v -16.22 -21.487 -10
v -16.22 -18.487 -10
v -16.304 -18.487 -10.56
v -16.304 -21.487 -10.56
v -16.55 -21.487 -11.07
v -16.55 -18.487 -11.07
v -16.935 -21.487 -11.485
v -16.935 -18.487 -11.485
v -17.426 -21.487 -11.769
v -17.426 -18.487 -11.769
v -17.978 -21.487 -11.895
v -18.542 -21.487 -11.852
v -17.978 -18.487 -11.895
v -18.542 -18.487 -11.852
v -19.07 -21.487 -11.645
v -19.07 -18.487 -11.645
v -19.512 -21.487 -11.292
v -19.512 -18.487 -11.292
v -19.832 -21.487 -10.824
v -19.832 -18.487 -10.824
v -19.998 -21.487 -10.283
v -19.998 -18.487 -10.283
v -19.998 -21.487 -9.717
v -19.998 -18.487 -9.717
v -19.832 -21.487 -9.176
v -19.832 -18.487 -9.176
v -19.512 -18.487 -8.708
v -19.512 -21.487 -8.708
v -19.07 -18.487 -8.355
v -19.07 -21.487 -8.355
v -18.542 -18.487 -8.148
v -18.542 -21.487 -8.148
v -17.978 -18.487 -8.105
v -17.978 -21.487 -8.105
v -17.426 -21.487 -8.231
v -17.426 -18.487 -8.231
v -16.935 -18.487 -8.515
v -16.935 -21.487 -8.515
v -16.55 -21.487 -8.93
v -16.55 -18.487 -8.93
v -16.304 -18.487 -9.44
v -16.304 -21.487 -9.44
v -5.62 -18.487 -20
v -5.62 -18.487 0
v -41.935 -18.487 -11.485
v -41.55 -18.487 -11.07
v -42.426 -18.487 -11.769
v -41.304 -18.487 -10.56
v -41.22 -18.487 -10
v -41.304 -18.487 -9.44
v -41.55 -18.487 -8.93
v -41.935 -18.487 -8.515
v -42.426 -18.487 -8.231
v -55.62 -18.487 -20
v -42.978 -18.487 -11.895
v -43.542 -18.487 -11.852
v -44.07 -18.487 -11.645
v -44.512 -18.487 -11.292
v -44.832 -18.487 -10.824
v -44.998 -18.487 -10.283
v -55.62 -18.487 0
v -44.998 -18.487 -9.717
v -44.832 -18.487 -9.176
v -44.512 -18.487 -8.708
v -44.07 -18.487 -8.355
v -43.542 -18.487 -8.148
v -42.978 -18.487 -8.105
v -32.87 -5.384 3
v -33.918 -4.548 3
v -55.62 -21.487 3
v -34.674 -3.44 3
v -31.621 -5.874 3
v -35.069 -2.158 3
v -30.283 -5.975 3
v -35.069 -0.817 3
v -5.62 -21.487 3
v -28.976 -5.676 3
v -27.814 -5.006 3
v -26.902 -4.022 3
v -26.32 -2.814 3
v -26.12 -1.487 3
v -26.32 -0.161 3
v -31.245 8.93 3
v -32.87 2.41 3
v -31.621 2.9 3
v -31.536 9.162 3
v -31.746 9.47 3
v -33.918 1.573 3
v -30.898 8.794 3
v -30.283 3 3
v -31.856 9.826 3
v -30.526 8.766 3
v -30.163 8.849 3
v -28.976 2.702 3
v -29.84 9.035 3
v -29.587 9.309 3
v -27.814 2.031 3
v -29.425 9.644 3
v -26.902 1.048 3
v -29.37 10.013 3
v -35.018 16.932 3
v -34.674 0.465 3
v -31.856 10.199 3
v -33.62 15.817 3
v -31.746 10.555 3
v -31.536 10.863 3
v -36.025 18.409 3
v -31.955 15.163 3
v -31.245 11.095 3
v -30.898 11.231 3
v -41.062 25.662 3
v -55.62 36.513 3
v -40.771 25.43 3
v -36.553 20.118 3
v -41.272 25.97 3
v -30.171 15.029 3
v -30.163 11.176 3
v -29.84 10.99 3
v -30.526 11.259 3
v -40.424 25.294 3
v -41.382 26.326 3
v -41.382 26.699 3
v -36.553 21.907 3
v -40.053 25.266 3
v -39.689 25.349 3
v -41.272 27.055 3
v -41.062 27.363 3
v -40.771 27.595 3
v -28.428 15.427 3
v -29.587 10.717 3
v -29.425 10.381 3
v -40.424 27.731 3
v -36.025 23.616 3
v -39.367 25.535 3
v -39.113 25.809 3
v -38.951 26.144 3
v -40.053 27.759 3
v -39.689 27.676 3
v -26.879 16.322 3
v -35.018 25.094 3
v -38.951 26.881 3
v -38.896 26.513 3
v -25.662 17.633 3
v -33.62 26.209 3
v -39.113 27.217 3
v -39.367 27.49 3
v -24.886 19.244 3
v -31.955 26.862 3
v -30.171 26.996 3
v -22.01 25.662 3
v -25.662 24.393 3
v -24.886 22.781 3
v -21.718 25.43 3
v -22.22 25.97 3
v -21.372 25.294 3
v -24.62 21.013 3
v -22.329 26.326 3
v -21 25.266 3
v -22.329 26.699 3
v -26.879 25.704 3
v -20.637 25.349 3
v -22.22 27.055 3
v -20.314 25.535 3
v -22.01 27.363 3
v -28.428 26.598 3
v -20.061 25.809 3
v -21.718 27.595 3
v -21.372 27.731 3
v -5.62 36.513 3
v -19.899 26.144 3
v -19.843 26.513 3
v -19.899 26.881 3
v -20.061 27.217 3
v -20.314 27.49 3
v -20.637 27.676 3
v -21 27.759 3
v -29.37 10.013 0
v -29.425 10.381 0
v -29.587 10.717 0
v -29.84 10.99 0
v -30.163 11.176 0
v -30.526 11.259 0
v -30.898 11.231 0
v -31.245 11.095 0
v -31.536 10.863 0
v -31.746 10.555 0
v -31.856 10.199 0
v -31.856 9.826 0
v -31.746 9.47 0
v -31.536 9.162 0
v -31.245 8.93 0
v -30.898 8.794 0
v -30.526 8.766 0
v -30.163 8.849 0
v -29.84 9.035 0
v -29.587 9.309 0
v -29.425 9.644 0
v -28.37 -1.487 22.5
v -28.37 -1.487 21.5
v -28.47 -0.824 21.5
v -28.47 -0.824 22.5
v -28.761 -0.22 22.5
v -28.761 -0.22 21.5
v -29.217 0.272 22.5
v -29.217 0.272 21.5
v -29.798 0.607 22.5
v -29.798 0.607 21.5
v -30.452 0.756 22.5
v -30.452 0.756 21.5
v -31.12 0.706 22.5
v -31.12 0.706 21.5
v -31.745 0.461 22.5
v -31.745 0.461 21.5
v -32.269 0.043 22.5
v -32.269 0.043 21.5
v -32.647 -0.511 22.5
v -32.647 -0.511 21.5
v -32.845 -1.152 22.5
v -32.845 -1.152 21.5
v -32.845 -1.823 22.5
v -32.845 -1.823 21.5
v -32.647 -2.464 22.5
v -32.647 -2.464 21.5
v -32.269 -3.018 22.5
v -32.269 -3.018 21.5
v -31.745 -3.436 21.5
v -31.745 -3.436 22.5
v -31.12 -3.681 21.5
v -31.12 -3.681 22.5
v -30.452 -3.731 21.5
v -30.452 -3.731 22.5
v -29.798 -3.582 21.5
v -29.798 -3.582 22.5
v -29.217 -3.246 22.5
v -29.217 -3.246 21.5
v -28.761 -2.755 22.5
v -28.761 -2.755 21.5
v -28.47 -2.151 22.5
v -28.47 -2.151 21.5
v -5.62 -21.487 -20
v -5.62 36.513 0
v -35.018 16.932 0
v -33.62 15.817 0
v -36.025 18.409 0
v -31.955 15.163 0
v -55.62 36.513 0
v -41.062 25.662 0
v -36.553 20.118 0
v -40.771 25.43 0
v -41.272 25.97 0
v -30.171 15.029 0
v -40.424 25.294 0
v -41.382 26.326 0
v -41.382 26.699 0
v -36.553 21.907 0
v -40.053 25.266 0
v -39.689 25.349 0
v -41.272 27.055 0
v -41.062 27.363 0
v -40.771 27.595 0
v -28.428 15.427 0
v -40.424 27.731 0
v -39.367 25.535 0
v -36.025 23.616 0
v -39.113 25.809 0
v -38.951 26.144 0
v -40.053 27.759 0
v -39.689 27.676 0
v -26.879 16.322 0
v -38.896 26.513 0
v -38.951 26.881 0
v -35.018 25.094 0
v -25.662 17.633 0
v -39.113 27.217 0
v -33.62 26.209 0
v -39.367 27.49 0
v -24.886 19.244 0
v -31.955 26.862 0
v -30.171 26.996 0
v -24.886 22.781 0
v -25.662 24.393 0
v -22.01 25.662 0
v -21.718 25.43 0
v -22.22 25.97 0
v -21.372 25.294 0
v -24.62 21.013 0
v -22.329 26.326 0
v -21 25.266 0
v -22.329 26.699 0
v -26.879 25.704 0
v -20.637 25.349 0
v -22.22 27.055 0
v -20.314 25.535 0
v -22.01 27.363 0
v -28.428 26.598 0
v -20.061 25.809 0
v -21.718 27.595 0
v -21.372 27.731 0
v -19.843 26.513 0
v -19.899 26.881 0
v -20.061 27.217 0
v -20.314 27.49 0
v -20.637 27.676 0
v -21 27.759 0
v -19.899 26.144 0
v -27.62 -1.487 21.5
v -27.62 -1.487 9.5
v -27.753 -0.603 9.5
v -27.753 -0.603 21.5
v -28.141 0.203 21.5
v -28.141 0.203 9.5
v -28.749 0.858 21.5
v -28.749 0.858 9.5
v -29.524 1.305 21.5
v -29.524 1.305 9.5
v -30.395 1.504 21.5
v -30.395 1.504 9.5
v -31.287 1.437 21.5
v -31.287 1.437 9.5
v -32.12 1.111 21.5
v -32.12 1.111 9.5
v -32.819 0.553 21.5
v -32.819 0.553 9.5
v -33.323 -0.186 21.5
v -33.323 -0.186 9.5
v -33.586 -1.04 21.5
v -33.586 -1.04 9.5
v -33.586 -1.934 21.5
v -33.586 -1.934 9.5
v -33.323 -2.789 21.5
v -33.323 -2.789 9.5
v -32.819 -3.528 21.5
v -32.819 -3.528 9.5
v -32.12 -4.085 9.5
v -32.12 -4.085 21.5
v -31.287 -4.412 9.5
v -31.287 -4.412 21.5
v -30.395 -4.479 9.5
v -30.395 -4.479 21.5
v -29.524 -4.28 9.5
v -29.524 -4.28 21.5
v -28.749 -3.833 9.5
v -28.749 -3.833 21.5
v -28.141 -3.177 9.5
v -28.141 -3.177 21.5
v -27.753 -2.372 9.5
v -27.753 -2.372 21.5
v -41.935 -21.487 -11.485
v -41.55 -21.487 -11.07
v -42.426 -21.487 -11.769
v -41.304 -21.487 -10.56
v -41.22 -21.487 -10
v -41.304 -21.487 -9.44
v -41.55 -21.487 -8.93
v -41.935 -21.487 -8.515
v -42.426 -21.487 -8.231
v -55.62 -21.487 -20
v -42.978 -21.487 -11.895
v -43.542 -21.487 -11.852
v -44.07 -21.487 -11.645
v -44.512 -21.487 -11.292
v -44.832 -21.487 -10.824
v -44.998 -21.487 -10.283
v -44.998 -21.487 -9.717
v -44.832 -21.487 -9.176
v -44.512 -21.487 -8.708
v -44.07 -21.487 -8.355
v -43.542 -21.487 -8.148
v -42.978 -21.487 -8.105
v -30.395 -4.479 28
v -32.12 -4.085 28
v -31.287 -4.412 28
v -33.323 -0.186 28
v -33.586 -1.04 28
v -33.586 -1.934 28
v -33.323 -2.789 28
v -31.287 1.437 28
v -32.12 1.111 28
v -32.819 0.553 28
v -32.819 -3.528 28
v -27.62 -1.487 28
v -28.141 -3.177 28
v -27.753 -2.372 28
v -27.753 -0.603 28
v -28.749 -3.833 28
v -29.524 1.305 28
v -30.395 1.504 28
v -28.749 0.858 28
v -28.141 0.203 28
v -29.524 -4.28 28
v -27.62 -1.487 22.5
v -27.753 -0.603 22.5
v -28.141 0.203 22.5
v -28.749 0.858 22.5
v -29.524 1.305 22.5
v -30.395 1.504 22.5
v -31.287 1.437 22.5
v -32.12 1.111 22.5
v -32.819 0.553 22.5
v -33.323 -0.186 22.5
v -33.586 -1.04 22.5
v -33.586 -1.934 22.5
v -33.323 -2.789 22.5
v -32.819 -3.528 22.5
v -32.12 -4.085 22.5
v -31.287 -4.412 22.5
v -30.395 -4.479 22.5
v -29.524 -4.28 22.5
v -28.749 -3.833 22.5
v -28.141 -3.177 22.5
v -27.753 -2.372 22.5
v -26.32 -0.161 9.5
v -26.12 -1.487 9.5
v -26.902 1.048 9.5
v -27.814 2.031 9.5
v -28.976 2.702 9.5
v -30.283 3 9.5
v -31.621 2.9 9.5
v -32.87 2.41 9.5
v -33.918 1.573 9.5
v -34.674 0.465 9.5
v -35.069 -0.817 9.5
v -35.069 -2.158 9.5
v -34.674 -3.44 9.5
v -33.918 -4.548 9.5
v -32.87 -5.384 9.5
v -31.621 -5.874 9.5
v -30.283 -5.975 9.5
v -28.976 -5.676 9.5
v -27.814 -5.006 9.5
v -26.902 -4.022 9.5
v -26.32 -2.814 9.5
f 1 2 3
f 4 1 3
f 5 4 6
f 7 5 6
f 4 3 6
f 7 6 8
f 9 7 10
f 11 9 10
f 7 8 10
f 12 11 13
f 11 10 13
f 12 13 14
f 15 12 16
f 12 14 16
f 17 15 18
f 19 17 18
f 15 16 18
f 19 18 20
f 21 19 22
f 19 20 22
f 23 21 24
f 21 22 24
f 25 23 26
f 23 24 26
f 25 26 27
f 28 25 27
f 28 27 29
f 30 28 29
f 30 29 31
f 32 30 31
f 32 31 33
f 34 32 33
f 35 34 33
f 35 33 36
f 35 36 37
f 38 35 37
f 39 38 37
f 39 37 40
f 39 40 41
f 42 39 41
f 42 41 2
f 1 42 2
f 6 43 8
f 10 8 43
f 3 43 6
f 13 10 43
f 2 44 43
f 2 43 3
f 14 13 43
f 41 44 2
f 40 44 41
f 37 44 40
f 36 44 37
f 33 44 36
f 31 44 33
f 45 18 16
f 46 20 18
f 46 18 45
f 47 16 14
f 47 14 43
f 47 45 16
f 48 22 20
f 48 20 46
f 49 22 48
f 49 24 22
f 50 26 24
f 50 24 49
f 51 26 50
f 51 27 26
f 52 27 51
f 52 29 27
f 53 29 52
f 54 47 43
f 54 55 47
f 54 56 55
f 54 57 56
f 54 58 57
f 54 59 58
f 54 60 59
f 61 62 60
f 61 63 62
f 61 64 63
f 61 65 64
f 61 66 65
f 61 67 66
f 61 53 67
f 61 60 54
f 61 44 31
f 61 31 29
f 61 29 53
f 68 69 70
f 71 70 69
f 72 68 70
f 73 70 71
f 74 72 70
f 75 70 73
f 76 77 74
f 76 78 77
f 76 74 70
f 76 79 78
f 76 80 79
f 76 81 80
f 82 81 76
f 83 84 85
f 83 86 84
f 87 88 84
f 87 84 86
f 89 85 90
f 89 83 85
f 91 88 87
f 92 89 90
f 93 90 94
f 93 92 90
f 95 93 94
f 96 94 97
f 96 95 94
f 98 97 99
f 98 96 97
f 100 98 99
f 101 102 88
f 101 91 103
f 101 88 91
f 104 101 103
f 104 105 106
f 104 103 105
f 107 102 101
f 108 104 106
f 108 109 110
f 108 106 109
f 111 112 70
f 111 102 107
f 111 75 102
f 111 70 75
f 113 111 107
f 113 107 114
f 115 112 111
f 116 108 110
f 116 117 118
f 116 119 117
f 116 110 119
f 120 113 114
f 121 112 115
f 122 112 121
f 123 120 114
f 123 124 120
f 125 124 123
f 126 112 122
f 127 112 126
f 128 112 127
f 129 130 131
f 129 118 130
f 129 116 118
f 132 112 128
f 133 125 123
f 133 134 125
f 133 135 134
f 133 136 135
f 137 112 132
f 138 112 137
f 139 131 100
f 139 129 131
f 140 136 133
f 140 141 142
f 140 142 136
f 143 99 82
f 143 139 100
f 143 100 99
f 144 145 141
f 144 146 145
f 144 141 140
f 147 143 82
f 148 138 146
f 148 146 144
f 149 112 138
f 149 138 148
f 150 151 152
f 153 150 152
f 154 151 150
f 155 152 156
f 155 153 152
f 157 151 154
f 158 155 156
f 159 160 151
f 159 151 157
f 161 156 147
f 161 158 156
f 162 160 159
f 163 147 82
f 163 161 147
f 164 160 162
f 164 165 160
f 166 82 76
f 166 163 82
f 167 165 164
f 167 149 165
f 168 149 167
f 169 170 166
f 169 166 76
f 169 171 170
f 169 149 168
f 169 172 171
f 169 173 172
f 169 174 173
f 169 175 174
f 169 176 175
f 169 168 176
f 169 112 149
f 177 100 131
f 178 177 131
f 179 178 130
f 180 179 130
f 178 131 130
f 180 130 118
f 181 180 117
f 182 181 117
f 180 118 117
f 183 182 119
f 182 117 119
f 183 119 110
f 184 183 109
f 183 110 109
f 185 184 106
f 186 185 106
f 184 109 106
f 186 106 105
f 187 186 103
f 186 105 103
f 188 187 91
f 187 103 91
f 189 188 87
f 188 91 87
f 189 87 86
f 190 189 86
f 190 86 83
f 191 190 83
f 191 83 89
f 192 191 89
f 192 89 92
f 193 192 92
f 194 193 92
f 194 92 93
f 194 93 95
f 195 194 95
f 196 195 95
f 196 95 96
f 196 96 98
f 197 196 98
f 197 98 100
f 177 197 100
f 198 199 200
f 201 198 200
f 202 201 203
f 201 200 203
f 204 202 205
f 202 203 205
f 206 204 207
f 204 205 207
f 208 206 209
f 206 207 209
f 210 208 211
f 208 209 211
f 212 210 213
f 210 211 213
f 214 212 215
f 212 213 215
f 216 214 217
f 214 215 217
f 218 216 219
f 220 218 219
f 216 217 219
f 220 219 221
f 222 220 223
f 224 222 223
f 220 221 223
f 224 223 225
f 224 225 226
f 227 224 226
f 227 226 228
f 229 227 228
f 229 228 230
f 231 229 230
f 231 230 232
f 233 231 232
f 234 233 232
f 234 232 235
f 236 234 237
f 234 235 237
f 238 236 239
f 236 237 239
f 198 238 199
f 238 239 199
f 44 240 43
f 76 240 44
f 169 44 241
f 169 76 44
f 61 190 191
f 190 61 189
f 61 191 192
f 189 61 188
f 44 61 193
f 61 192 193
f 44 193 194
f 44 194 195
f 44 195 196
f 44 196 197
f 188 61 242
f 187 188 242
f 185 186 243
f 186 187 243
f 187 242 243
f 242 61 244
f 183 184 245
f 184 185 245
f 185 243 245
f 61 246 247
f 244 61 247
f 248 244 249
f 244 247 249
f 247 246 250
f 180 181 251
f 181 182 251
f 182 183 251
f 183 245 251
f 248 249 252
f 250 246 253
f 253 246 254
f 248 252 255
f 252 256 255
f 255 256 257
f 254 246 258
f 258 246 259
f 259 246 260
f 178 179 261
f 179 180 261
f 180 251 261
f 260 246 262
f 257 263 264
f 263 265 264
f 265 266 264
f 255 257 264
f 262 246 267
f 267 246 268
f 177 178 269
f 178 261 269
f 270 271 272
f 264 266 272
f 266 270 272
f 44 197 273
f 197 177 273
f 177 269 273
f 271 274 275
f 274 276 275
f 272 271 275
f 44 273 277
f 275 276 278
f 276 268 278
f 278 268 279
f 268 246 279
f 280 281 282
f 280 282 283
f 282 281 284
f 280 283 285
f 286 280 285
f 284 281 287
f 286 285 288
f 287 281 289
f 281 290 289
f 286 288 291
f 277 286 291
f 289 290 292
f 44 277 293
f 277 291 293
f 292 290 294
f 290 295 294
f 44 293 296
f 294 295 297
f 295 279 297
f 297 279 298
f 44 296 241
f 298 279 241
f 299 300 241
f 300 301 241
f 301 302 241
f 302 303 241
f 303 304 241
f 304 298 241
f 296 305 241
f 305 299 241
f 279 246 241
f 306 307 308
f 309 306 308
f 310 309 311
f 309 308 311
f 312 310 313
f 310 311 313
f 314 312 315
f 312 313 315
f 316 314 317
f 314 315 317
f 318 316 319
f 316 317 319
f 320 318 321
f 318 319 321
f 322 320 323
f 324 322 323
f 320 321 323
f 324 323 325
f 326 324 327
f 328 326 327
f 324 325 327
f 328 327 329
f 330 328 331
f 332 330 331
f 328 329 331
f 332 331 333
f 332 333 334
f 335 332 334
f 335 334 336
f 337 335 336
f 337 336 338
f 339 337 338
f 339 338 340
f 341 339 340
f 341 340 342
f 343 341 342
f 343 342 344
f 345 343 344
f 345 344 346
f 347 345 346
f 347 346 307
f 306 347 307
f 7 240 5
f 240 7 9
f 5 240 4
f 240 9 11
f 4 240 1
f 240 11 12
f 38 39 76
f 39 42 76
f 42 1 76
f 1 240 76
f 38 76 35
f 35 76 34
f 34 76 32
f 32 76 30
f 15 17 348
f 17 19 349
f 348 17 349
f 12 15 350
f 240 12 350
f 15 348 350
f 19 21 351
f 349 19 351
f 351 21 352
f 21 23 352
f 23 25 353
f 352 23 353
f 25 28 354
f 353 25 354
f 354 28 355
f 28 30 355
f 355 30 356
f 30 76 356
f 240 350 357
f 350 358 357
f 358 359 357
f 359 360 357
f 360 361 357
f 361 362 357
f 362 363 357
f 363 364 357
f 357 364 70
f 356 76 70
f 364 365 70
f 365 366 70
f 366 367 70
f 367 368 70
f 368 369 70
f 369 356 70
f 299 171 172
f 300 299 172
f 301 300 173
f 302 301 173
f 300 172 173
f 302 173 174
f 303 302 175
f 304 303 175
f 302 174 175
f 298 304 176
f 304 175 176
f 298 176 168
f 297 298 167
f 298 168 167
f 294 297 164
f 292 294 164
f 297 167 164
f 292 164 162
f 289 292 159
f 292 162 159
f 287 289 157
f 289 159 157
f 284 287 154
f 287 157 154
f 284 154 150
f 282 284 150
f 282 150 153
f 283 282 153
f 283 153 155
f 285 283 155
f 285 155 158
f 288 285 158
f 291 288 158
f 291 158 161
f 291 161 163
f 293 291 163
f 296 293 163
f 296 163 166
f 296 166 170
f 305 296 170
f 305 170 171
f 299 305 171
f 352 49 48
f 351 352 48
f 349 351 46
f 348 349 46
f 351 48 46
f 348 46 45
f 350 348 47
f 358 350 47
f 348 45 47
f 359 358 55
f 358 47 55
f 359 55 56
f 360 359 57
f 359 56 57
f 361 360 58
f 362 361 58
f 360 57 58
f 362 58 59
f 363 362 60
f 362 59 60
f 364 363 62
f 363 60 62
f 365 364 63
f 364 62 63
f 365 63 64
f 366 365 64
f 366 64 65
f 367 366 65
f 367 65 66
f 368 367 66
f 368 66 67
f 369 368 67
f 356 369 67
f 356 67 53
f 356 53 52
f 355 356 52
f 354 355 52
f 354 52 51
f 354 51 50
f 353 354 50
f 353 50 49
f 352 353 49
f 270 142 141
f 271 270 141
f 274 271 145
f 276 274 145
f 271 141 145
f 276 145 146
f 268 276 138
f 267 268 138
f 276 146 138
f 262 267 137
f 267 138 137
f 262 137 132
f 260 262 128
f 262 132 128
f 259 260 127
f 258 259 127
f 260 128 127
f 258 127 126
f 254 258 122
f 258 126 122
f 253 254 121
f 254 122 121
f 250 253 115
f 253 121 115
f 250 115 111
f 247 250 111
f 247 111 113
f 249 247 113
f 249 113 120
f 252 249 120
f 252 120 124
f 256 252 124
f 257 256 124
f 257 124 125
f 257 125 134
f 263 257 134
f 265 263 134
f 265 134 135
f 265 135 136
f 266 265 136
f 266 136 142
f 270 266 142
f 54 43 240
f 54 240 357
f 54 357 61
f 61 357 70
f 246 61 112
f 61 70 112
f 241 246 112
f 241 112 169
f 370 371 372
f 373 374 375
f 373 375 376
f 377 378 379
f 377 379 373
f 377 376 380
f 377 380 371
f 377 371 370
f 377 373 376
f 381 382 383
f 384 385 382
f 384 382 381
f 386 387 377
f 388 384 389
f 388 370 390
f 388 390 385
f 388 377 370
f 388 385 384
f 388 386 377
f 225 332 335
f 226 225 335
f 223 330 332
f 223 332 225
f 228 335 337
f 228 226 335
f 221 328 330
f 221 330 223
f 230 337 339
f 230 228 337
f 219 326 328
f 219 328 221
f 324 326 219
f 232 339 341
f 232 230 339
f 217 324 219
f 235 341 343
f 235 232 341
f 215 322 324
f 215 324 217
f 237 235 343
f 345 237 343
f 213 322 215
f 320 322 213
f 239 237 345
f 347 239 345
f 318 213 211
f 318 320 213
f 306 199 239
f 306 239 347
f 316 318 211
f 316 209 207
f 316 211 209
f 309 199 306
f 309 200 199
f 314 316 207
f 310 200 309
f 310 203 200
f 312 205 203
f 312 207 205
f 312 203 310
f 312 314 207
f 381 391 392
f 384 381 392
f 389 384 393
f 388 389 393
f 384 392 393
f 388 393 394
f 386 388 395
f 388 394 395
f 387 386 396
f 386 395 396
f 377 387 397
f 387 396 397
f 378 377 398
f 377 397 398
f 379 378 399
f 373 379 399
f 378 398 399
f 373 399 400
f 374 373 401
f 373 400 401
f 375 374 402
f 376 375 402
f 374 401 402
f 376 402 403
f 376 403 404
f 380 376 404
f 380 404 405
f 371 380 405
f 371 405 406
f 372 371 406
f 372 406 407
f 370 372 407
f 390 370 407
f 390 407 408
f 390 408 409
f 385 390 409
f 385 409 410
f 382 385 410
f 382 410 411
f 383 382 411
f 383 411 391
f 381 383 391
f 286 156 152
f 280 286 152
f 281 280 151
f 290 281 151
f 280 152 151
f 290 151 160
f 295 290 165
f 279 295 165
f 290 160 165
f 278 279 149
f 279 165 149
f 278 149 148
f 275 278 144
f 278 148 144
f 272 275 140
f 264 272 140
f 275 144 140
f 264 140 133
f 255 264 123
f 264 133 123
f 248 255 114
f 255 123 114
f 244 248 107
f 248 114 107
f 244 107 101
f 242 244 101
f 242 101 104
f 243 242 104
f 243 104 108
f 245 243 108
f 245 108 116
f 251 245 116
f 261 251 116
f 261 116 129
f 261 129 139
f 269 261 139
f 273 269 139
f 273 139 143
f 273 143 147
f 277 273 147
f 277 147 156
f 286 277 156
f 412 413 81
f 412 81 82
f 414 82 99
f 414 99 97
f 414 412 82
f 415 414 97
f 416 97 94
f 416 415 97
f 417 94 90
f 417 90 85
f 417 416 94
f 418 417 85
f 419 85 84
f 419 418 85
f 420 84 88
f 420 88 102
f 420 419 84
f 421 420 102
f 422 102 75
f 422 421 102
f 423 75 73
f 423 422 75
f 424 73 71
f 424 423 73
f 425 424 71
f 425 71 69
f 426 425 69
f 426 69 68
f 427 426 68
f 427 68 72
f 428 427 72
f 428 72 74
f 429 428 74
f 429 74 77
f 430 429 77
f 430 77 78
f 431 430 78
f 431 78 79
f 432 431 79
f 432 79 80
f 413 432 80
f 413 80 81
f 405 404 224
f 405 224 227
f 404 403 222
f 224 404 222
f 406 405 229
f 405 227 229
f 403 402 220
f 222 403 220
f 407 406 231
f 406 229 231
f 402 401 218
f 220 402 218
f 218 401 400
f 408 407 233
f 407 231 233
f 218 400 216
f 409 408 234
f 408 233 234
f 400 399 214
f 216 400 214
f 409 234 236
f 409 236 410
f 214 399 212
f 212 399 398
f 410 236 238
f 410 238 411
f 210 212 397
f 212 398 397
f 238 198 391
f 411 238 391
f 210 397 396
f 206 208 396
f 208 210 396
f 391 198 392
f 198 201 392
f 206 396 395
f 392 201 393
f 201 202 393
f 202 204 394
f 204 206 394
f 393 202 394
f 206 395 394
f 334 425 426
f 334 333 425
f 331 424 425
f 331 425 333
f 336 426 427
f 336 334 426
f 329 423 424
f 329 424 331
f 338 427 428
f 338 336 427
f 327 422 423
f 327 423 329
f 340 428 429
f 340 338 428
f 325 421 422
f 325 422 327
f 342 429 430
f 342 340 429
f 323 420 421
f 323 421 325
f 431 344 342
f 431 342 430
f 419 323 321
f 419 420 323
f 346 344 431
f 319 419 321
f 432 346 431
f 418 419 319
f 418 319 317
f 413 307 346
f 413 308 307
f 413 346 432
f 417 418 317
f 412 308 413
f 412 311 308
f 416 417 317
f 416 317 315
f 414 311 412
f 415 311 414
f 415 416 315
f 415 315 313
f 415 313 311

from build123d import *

# Parameters (mm, degrees)
SKETCH1_W           = 50
SKETCH1_H           = 58
BOSS_EXTRUDE1_DEPTH = 3
SKETCH2_W           = 50
SKETCH2_H           = 3
BOSS_EXTRUDE2_DEPTH = 20
SKETCH6_R           = 3
BOSS_EXTRUDE3_DEPTH = 25
SKETCH7_R           = 6
CUT_EXTRUDE2_DEPTH  = 24
SKETCH9_R           = 1.9
CUT_EXTRUDE3_DEPTH  = 4
SKETCH10_R          = 1.25
CUT_EXTRUDE4_DEPTH  = 10
BOSS_EXTRUDE4_REACH = 31.5
SKETCH11_R          = 4.5
SKETCH12_R          = 3
SKETCH12_R_2        = 2.25
CUT_EXTRUDE5_DEPTH  = 1


with BuildPart() as part:
    # Sketch1 → Boss-Extrude1 (new body)
    with BuildSketch(Plane.XY):
        with Locations((-30.619684785, 7.512687188)):
            Rectangle(SKETCH1_W, SKETCH1_H)
    extrude(amount=BOSS_EXTRUDE1_DEPTH)

    # Sketch2 → Boss-Extrude2 (add)
    with BuildSketch(Plane(origin=(0, 0, 0), x_dir=(-1, 0, 0), z_dir=(0, 0, -1))):
        with Locations((30.619684785, -19.987312812)):
            Rectangle(SKETCH2_W, SKETCH2_H)
    extrude(amount=BOSS_EXTRUDE2_DEPTH)

    # Sketch6 → Boss-Extrude3 (add)
    with BuildSketch(Plane.XY.offset(3)):
        with Locations((-30.619684785, -1.487312812)):
            Circle(SKETCH6_R)
    extrude(amount=BOSS_EXTRUDE3_DEPTH)

    # Sketch7 → Cut-Extrude2 (cut, through all)
    with BuildSketch(Plane.XY.offset(3)):
        with Locations((-30.619684785, 21.012687188)):
            Circle(SKETCH7_R)
    extrude(amount=-CUT_EXTRUDE2_DEPTH, mode=Mode.SUBTRACT)

    # Sketch9 → Cut-Extrude3 (cut, through all)
    with BuildSketch(Plane(origin=(0, -18.487312812, 0), x_dir=(1, 0, 0), z_dir=(0, 1, 0))):
        with Locations((-18.119684785, 10)):
            Circle(SKETCH9_R)
        with Locations((-43.119684785, 10)):
            Circle(SKETCH9_R)
    extrude(amount=-CUT_EXTRUDE3_DEPTH, mode=Mode.SUBTRACT)

    # Sketch10 → Cut-Extrude4 (cut)
    with BuildSketch(Plane.XY.offset(3)):
        with Locations((-40.145964226, 26.512687188)):
            Circle(SKETCH10_R)
        with Locations((-21.093405343, 26.512687188)):
            Circle(SKETCH10_R)
        with Locations((-30.619684785, 10.012687188)):
            Circle(SKETCH10_R)
    extrude(amount=-CUT_EXTRUDE4_DEPTH, mode=Mode.SUBTRACT)

    # Sketch11 → Boss-Extrude4 (add, up to next)
    with BuildSketch(Plane.XY.offset(9.5), mode=Mode.PRIVATE) as boss_extrude4_sk1:
        with Locations((-30.619684785, -1.487312812)):
            Circle(SKETCH11_R)
    boss_extrude4_tool1 = extrude(boss_extrude4_sk1.sketch, amount=-BOSS_EXTRUDE4_REACH, mode=Mode.PRIVATE) - part.part
    add(boss_extrude4_tool1.solids().sort_by_distance((-30.619685, -1.487313, 9.5))[0])

    # Sketch12 → Cut-Extrude5 (cut)
    with BuildSketch(Plane.XY.offset(21.5)):
        with Locations((-30.619684785, -1.487312812)):
            Circle(SKETCH12_R)
        with Locations((-30.619684785, -1.487312812)):
            Circle(SKETCH12_R_2, mode=Mode.SUBTRACT)
    extrude(amount=CUT_EXTRUDE5_DEPTH, mode=Mode.SUBTRACT)


solid = part.part
